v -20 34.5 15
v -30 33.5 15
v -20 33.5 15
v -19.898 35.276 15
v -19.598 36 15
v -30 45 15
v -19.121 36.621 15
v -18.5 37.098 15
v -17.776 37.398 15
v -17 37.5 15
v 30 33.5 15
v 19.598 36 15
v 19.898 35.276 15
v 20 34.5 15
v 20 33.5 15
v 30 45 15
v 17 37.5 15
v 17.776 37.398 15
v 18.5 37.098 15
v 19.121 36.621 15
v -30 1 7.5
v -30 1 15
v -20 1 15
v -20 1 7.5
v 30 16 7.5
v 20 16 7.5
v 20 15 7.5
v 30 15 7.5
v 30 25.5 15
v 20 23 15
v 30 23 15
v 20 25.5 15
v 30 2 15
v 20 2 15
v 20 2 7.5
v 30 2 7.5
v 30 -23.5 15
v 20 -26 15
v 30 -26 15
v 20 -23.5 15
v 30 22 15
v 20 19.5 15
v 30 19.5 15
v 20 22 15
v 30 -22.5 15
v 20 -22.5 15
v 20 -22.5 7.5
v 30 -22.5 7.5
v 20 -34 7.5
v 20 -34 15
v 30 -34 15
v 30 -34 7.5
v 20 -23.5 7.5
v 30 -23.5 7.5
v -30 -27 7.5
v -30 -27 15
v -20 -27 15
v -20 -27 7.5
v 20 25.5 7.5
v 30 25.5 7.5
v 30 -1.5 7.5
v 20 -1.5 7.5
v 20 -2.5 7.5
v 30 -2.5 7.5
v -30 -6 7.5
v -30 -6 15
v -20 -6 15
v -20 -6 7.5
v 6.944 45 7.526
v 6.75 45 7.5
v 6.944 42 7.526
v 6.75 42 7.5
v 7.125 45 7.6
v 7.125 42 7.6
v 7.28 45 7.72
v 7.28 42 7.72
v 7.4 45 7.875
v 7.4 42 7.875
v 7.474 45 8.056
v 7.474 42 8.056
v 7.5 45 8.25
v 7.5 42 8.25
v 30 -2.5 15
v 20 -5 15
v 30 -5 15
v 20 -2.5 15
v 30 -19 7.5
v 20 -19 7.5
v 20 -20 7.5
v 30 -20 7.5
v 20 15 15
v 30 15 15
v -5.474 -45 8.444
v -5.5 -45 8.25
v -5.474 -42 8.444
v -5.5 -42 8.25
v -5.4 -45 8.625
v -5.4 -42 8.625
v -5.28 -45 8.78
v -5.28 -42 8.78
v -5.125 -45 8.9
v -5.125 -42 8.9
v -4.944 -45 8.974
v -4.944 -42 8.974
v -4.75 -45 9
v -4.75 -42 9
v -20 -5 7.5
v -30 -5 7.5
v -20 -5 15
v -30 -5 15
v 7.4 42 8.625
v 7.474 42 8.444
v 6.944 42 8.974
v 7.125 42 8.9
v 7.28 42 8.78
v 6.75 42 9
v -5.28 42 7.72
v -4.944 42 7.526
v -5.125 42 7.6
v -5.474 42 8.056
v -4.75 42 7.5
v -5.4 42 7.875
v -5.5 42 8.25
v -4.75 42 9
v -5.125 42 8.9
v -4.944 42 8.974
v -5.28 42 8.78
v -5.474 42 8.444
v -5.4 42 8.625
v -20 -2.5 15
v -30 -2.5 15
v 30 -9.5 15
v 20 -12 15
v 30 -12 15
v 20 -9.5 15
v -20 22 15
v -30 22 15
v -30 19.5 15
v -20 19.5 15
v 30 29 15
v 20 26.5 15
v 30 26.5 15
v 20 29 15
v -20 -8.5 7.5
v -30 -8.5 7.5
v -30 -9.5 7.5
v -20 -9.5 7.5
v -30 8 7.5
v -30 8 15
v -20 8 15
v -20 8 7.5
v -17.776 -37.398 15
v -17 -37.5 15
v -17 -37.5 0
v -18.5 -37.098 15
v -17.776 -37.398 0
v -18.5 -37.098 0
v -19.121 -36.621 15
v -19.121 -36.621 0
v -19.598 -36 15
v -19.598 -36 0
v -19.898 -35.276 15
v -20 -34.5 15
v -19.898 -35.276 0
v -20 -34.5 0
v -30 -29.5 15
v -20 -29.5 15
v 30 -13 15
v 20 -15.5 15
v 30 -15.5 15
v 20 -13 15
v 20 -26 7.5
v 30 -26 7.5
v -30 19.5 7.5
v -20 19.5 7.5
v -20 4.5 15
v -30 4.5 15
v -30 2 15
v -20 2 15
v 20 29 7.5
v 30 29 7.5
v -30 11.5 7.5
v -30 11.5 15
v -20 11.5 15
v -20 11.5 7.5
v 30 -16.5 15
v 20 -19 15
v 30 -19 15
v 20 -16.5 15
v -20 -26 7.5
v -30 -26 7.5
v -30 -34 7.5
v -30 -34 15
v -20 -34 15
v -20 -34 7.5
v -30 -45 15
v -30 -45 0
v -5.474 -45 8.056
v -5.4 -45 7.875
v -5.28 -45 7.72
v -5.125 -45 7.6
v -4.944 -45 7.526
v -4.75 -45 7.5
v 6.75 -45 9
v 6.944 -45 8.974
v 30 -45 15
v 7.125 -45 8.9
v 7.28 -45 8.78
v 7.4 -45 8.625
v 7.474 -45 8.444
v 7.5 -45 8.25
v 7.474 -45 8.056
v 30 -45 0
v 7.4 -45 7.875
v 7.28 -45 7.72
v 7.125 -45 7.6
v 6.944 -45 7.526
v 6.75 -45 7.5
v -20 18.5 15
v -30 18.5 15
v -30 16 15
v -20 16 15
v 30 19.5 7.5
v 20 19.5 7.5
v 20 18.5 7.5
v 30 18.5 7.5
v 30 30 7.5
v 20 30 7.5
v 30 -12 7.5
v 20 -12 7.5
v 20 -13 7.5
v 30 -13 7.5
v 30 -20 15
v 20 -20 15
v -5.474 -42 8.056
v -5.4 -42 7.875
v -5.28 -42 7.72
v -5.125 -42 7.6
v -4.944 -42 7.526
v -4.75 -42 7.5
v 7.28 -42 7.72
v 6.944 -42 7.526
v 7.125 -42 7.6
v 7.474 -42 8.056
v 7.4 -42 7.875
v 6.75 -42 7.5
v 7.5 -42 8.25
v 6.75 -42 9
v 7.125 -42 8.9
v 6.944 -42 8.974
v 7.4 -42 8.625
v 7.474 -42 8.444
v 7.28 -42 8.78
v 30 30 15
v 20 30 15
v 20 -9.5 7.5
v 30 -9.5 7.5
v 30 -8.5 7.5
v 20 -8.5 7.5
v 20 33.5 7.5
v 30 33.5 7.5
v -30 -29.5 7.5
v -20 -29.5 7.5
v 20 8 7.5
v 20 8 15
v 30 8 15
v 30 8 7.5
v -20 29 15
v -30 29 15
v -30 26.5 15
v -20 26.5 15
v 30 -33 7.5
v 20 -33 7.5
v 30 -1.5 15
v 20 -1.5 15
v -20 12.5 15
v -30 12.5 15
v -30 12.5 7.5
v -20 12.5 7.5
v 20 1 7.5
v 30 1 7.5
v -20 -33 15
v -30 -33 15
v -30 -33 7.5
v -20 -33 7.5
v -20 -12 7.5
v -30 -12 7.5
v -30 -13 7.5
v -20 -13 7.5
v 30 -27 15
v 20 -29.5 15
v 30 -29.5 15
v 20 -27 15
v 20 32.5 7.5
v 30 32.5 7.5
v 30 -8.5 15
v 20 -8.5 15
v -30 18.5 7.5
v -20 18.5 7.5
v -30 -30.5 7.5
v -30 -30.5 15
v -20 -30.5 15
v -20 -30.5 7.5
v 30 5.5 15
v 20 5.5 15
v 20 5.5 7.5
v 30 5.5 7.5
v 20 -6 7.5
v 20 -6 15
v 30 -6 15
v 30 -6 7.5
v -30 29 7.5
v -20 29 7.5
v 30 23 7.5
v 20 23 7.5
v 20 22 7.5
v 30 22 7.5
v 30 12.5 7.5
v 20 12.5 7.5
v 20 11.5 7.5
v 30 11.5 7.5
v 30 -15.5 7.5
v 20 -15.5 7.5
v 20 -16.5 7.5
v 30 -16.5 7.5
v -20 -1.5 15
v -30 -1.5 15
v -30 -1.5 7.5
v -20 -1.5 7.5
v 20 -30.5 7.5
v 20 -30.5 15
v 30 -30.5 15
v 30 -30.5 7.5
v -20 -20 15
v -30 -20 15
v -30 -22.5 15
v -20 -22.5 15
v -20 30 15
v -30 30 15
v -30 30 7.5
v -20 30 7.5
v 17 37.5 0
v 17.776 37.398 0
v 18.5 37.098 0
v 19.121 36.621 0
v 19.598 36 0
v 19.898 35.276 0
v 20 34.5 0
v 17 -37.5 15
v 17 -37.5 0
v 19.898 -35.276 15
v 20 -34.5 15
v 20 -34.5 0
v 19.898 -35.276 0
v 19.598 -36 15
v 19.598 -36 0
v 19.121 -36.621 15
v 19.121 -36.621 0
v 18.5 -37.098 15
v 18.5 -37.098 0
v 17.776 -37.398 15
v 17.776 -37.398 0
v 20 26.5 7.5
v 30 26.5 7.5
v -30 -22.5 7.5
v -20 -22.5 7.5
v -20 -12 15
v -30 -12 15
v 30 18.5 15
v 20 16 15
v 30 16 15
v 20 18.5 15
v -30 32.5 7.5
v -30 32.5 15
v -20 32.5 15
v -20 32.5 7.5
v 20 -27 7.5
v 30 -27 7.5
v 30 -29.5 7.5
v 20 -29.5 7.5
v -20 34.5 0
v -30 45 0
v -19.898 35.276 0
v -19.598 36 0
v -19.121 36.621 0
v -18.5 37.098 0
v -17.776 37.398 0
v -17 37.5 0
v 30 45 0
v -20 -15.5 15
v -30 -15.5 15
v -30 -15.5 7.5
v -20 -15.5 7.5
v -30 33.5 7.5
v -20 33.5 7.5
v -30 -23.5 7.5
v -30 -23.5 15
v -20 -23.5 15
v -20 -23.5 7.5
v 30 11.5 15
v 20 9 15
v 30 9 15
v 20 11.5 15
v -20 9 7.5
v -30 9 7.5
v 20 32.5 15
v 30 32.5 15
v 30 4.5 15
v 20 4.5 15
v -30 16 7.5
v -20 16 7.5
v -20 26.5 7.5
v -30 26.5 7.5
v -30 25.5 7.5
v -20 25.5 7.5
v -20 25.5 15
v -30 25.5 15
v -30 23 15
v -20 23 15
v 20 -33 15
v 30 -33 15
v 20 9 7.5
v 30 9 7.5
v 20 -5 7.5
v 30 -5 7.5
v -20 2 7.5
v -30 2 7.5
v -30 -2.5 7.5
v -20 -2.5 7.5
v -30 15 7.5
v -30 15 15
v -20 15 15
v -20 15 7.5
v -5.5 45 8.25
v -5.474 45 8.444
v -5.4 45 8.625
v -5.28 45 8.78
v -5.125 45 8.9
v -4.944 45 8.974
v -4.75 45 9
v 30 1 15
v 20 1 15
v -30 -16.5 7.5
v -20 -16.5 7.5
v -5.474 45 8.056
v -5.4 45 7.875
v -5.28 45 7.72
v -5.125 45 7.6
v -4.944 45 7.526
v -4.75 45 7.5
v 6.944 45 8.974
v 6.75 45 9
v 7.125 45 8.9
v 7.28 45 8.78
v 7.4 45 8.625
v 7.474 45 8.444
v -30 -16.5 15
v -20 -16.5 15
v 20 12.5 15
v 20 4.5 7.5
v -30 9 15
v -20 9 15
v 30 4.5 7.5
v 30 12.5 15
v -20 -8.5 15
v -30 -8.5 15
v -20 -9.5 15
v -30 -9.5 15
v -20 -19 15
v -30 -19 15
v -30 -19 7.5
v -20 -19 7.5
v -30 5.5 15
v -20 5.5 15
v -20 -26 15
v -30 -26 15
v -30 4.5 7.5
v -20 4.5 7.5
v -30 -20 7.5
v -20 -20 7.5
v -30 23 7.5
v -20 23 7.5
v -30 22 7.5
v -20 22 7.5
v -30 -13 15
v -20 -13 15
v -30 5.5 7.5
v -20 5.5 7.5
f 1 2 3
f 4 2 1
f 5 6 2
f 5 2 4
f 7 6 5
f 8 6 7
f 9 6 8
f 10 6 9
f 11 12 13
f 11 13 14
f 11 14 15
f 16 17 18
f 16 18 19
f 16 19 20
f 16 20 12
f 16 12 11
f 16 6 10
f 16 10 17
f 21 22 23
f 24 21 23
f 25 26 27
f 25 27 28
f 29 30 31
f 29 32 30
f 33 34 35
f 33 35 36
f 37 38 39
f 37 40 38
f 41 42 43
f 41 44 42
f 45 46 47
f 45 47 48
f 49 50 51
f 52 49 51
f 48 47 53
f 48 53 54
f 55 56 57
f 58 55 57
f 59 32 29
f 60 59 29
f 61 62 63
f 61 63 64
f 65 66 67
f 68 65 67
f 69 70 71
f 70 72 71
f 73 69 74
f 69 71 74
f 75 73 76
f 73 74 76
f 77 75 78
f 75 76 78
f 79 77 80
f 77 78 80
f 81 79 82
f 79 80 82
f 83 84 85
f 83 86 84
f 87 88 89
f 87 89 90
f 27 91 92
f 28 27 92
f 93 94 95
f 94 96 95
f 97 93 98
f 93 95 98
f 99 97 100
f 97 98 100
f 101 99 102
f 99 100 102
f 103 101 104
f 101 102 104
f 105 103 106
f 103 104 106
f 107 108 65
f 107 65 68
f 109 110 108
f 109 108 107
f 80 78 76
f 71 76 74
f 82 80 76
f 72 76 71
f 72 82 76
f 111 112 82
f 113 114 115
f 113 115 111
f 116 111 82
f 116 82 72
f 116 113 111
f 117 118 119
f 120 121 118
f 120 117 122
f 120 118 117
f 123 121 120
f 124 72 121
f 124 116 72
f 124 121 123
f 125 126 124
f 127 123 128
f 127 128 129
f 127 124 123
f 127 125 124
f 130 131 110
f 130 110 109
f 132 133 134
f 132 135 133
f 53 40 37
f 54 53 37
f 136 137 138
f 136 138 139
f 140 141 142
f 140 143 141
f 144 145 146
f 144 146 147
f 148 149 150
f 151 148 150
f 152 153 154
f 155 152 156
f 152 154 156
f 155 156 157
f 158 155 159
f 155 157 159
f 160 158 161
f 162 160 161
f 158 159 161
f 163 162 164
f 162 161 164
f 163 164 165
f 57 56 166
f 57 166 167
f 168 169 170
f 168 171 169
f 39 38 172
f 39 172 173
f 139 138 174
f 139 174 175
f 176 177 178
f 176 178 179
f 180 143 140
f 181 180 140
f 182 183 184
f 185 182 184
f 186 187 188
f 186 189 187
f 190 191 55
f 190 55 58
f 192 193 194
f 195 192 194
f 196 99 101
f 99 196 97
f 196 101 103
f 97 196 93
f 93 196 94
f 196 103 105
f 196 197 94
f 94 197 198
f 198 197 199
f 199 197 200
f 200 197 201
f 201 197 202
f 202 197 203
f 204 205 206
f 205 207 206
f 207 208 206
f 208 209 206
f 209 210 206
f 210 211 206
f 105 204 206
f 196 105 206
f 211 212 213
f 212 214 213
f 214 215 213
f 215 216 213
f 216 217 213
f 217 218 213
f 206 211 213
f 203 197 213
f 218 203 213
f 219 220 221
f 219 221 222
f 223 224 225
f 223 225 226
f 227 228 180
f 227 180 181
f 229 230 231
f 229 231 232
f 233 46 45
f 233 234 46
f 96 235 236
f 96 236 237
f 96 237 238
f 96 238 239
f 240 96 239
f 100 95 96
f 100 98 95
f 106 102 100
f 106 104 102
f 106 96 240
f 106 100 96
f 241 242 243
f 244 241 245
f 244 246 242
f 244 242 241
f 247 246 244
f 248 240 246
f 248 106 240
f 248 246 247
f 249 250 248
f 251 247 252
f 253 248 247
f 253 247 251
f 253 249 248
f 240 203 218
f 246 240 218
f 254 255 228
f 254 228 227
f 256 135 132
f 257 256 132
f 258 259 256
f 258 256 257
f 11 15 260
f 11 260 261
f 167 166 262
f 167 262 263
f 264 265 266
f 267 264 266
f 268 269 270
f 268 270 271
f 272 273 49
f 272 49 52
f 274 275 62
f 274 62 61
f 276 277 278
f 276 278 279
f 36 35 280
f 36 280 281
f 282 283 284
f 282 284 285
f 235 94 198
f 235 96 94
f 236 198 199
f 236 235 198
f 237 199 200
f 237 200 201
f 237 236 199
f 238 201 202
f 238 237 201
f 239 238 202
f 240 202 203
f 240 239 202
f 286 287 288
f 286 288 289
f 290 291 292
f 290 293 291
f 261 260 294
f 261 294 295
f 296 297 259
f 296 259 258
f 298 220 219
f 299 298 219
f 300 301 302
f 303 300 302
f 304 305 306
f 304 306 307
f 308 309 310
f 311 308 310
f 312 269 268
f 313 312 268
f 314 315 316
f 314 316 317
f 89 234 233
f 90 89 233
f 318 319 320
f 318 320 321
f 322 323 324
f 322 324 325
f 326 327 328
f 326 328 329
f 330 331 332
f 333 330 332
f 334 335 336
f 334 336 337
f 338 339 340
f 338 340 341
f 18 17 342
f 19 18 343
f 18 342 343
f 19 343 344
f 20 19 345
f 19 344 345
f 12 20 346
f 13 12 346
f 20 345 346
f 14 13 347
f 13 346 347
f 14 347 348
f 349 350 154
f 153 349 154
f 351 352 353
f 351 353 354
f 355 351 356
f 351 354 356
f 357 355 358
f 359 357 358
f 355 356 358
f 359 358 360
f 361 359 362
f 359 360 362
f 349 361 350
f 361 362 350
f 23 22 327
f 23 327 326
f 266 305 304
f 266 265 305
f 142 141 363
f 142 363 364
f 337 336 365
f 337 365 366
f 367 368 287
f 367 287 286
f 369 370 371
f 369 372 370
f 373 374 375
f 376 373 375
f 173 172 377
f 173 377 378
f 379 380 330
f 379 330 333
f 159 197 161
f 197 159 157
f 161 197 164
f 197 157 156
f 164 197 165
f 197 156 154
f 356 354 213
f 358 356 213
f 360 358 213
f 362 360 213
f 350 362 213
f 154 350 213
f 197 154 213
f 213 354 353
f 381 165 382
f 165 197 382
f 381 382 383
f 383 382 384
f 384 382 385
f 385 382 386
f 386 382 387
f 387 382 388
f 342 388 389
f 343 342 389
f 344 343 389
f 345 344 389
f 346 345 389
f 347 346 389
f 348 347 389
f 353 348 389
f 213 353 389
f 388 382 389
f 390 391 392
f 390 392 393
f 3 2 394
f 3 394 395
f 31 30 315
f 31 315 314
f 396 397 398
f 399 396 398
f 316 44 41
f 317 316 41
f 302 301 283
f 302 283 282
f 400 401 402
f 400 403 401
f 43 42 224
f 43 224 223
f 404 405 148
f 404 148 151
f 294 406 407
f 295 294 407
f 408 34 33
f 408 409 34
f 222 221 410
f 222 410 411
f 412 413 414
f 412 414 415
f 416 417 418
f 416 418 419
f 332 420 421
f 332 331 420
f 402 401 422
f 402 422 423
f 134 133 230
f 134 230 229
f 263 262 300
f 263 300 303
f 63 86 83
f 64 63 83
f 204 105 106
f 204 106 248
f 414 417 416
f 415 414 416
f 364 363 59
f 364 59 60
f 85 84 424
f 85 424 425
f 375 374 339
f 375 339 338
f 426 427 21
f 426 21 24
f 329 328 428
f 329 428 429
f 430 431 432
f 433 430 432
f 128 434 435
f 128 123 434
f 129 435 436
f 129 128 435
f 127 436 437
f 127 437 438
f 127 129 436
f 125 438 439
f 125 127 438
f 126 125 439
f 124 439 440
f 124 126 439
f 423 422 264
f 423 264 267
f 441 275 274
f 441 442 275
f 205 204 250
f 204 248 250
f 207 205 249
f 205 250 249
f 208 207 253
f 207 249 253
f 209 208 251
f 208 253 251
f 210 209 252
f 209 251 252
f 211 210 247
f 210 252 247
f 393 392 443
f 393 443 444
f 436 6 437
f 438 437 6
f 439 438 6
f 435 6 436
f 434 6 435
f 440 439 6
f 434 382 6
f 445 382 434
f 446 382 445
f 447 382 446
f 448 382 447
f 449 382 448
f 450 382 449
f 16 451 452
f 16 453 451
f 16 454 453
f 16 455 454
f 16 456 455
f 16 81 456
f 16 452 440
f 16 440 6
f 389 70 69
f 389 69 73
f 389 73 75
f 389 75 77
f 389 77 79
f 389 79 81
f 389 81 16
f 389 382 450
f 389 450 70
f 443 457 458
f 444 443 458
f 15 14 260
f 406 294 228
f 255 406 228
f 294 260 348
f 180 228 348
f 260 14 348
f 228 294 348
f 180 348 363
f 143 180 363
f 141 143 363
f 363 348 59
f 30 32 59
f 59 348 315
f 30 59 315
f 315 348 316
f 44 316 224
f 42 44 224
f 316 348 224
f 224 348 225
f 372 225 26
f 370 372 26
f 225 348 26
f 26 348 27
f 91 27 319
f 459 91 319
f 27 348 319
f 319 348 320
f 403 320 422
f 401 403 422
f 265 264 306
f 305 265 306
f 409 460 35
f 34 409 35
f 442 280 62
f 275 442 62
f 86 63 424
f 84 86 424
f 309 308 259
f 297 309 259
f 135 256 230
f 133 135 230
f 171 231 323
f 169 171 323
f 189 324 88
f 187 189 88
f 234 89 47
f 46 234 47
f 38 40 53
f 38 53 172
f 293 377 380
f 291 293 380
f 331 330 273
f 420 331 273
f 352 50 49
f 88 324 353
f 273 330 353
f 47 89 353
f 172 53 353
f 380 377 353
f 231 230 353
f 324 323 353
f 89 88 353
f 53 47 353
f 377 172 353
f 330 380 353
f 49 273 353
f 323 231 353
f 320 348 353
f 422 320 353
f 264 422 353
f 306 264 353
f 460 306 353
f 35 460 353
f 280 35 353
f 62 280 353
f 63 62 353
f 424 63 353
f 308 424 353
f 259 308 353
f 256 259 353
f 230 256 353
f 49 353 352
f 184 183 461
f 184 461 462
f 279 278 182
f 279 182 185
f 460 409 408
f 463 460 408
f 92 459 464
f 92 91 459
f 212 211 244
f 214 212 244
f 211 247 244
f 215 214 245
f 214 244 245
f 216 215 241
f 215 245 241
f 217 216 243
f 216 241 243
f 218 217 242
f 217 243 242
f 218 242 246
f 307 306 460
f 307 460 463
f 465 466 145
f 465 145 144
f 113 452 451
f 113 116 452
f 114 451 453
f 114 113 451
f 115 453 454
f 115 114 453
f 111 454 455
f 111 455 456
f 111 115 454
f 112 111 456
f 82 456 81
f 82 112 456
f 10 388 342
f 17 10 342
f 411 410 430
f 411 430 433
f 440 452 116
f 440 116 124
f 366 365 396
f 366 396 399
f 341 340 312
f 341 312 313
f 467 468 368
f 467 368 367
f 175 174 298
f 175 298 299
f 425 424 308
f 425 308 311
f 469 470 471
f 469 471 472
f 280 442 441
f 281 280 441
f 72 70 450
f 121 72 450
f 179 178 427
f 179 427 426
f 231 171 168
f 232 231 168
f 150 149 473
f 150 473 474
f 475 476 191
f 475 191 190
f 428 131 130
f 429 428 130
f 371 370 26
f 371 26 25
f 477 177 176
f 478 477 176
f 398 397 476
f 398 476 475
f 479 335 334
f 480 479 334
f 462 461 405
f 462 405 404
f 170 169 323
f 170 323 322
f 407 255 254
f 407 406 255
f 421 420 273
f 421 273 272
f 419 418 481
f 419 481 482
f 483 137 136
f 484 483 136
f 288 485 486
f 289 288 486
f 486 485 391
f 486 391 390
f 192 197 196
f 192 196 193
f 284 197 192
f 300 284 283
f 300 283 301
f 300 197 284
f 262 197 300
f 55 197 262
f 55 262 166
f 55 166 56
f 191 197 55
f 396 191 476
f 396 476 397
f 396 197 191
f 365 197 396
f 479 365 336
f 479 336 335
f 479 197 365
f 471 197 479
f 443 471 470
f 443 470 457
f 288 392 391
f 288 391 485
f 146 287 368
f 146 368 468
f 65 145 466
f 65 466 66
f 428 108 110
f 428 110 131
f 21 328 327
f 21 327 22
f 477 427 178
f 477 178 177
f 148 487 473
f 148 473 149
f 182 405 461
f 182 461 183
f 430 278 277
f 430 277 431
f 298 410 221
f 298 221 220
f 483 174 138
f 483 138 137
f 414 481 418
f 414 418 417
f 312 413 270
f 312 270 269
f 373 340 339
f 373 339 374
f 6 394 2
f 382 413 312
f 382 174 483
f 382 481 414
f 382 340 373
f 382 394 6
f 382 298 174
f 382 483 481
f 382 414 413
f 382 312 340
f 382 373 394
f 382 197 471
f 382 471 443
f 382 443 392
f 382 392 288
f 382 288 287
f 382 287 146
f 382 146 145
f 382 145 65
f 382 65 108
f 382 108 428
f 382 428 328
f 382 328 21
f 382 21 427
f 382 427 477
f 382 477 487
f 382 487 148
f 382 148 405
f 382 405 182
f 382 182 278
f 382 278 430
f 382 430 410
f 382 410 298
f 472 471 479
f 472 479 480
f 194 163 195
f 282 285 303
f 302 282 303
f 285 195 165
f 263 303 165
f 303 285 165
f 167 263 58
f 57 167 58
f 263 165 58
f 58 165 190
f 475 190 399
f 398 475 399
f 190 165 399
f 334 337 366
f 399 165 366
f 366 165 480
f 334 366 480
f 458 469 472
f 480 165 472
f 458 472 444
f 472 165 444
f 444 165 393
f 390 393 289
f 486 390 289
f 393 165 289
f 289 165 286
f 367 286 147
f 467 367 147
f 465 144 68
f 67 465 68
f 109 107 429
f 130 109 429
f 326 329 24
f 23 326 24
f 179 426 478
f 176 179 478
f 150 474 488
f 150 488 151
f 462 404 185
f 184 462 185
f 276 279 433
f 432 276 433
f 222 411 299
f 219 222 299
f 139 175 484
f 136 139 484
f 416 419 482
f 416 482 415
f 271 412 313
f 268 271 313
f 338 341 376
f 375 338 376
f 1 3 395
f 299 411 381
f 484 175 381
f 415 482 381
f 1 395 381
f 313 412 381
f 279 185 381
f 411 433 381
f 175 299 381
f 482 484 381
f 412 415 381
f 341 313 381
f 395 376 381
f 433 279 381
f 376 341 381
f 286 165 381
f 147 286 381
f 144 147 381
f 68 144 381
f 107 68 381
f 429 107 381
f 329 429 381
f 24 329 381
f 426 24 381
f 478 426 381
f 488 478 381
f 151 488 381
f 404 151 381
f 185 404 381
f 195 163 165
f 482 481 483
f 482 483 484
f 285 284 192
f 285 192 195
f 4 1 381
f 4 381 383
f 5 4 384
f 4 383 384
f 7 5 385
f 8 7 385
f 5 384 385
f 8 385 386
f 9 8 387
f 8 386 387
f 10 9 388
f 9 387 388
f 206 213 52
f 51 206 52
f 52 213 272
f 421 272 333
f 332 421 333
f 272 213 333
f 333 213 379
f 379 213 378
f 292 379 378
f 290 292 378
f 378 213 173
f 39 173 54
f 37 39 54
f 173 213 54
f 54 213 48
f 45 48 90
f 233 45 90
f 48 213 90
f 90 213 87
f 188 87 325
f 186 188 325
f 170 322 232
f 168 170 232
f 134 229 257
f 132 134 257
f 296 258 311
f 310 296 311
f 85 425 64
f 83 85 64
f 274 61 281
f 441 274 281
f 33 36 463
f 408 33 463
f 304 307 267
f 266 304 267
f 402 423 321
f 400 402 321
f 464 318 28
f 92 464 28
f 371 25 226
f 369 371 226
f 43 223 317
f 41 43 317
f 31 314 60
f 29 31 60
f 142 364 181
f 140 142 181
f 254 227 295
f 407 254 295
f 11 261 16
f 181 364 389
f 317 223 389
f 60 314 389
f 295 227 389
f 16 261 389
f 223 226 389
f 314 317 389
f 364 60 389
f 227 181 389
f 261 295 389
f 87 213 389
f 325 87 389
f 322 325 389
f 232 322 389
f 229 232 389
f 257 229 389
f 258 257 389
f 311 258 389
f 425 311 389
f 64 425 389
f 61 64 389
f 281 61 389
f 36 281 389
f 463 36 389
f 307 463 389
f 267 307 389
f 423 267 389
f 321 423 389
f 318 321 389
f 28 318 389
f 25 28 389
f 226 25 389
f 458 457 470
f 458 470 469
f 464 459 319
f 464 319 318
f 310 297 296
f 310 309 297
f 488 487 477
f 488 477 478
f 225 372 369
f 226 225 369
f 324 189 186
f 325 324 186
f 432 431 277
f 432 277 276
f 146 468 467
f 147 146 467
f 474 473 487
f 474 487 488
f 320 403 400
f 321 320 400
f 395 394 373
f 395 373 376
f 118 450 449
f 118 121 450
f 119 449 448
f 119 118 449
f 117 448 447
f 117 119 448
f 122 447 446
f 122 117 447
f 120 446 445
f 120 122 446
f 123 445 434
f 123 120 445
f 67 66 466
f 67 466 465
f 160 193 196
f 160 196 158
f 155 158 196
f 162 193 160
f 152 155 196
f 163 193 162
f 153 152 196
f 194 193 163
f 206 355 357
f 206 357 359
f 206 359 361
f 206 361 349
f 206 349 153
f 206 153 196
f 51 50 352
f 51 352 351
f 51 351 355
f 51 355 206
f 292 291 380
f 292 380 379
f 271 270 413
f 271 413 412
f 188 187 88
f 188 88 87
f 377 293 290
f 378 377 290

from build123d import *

# Parameters (mm, degrees)
F0_W     = 60
F0_H     = 90
F1_DEPTH = 15
F2_W     = 60
F2_H     = 1
F3_DEPTH = 7.5
F4_W     = 13
F4_H     = 1.5
F5_DEPTH = 3
F6_R     = 0.74999
F7_W     = 13
F7_H     = 1.5
F8_DEPTH = 3
F9_R     = 0.74999


# Not quite as in the source:
# - a fillet or chamfer is up to 0.001 mm smaller than in the source, because OpenCascade refuses the exact size


with BuildPart() as f1:
    # F0 (on Top) → F1 (new body)
    with BuildSketch(Plane.XY):
        Rectangle(F0_W, F0_H)
        with BuildLine():
            ThreePointArc((-20, 34.5), (-19.1213203436, 36.6213203436), (-17, 37.5))
            Line((-17, 37.5), (17, 37.5))
            ThreePointArc((17, 37.5), (19.1213203436, 36.6213203436), (20, 34.5))
            Line((20, 34.5), (20, -34.5))
            ThreePointArc((20, -34.5), (19.1213203436, -36.6213203436), (17, -37.5))
            Line((17, -37.5), (-17, -37.5))
            ThreePointArc((-17, -37.5), (-19.1213203436, -36.6213203436), (-20, -34.5))
            Line((-20, -34.5), (-20, 34.5))
        make_face(mode=Mode.SUBTRACT)
    extrude(amount=F1_DEPTH)

    # F2 (on face) → F3 (cut)
    with BuildSketch(Plane.XY.offset(15)):
        with Locations((0, -33.5)):
            Rectangle(F2_W, F2_H)
        with Locations((0, -30)):
            Rectangle(F2_W, F2_H)
        with Locations((0, -26.5)):
            Rectangle(F2_W, F2_H)
        with Locations((0, -23)):
            Rectangle(F2_W, F2_H)
        with Locations((0, -19.5)):
            Rectangle(F2_W, F2_H)
        with Locations((0, -16)):
            Rectangle(F2_W, F2_H)
        with Locations((0, -12.5)):
            Rectangle(F2_W, F2_H)
        with Locations((0, -9)):
            Rectangle(F2_W, F2_H)
        with Locations((0, -5.5)):
            Rectangle(F2_W, F2_H)
        with Locations((0, -2)):
            Rectangle(F2_W, F2_H)
        with Locations((0, 1.5)):
            Rectangle(F2_W, F2_H)
        with Locations((0, 5)):
            Rectangle(F2_W, F2_H)
        with Locations((0, 8.5)):
            Rectangle(F2_W, F2_H)
        with Locations((0, 12)):
            Rectangle(F2_W, F2_H)
        with Locations((0, 15.5)):
            Rectangle(F2_W, F2_H)
        with Locations((0, 19)):
            Rectangle(F2_W, F2_H)
        with Locations((0, 22.5)):
            Rectangle(F2_W, F2_H)
        with Locations((0, 26)):
            Rectangle(F2_W, F2_H)
        with Locations((0, 29.5)):
            Rectangle(F2_W, F2_H)
        with Locations((0, 33)):
            Rectangle(F2_W, F2_H)
    extrude(amount=-F3_DEPTH, mode=Mode.SUBTRACT)

    # F4 (on face) → F5 (cut)
    with BuildSketch(Plane.XZ.offset(45)):
        with Locations((1, 8.25)):
            Rectangle(F4_W, F4_H)
    extrude(amount=-F5_DEPTH, mode=Mode.SUBTRACT)

    # F6 (radius 0.75 in the source; OpenCascade refuses exactly that, so slightly less here)
    f6_edges = [f1.edges().sort_by_distance(p)[0] for p in [
        (-5.5, -43.5, 7.5),
        (-5.5, -43.5, 9),
        (7.5, -43.5, 7.5),
        (7.5, -43.5, 9),
    ]]
    fillet(f6_edges, radius=F6_R)

    # F7 (on face) → F8 (cut)
    with BuildSketch(Plane(origin=(0, 45, 0), x_dir=(-1, 0, 0), z_dir=(0, 1, 0))):
        with Locations((-1, 8.25)):
            Rectangle(F7_W, F7_H)
    extrude(amount=-F8_DEPTH, mode=Mode.SUBTRACT)

    # F9 (radius 0.75 in the source; OpenCascade refuses exactly that, so slightly less here)
    f9_edges = [f1.edges().sort_by_distance(p)[0] for p in [
        (-5.5, 43.5, 7.5),
        (-5.5, 43.5, 9),
        (7.5, 43.5, 9),
        (7.5, 43.5, 7.5),
    ]]
    fillet(f9_edges, radius=F9_R)


solid = f1.part
